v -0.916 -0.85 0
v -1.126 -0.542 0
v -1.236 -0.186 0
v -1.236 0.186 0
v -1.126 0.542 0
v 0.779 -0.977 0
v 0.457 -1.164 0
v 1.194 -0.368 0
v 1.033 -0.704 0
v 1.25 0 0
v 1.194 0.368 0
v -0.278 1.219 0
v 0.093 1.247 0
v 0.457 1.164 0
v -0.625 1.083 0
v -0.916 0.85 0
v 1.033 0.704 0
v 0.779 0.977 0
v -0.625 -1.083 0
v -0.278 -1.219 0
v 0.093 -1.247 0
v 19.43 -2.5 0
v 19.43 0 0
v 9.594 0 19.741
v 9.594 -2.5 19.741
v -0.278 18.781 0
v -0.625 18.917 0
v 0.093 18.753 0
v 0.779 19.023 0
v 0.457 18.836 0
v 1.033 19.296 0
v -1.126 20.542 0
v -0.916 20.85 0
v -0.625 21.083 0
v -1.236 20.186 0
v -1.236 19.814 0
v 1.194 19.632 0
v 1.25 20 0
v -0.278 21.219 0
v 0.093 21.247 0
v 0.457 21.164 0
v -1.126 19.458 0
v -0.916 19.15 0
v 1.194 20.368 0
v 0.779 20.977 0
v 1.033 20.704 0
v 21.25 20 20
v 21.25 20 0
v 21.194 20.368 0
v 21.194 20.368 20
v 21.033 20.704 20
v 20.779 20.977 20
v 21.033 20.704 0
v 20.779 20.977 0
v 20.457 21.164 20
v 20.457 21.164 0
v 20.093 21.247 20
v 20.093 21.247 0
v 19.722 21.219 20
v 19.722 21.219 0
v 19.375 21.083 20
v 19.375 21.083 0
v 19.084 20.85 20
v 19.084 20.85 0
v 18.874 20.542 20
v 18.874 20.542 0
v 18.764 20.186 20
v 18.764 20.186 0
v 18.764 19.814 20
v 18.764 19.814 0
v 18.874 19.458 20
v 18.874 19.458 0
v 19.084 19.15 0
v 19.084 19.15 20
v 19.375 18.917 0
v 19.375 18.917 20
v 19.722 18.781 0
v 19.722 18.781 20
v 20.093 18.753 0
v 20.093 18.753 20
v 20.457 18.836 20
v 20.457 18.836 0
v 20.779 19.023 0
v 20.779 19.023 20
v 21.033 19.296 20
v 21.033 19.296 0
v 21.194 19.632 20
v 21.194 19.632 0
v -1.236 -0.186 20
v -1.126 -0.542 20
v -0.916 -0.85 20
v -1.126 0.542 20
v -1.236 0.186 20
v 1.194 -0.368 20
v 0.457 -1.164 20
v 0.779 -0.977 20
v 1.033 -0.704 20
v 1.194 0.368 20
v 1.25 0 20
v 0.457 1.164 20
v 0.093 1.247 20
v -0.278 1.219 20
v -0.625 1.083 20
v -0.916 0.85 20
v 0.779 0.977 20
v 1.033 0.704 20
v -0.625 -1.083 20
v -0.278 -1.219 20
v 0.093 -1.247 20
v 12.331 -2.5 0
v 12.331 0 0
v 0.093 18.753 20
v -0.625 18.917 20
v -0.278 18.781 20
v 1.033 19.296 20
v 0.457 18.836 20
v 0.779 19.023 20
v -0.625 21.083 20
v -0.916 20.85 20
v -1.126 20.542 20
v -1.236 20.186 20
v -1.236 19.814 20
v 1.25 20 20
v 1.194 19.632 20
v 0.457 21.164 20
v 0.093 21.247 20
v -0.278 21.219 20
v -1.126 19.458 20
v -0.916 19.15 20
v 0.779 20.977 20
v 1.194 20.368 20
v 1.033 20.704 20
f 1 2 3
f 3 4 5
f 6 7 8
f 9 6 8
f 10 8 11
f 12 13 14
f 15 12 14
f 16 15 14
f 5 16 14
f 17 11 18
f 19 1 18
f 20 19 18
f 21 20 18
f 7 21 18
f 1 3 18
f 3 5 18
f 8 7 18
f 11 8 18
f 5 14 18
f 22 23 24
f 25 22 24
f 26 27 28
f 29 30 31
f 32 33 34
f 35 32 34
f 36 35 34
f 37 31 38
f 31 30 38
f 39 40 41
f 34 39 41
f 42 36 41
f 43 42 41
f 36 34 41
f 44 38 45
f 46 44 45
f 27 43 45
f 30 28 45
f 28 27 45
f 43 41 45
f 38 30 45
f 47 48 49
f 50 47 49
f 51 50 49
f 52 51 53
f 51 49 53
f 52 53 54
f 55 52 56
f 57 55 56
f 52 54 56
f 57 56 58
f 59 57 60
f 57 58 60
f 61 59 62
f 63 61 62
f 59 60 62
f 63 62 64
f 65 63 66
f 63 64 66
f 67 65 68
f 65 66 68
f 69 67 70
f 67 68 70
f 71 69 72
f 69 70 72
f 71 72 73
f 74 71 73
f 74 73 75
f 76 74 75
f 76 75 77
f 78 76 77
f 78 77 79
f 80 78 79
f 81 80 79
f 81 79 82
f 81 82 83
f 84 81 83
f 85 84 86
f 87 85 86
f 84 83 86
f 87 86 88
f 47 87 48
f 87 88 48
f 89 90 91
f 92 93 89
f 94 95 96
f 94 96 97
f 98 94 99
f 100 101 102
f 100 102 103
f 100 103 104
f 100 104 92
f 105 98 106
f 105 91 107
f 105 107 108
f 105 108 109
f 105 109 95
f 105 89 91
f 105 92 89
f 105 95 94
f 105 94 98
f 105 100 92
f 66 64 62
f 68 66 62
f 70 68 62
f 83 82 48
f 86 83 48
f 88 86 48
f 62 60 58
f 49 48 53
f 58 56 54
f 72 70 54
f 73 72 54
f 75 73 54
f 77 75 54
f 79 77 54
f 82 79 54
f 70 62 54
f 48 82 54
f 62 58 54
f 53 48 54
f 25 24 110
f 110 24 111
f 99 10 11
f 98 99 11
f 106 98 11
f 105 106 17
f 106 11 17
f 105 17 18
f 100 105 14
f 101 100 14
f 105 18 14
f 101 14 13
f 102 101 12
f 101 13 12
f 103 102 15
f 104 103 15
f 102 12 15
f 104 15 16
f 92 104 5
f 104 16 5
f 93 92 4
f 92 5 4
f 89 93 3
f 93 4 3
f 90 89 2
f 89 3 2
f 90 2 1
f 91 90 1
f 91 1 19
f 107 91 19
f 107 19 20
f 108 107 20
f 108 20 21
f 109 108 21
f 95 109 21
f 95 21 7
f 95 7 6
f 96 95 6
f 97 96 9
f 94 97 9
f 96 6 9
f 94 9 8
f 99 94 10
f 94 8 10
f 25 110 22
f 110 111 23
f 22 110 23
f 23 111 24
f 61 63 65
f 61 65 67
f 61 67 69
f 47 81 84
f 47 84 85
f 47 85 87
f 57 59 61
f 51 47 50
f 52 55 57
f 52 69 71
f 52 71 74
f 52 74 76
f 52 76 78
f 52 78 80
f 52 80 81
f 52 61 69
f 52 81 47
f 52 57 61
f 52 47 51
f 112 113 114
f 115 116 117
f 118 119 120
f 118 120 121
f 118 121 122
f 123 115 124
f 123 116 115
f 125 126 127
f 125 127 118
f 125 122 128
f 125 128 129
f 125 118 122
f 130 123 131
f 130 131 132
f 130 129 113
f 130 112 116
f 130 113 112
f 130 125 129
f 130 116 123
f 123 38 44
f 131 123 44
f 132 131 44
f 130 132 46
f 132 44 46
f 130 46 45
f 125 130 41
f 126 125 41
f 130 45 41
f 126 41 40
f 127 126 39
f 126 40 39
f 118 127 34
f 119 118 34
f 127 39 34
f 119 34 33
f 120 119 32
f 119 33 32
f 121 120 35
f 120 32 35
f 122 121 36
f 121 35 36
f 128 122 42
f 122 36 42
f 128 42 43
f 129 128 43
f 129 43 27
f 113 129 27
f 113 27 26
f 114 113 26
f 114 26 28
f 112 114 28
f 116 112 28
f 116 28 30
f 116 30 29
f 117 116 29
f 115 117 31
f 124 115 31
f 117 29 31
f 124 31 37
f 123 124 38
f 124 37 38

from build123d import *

# Parameters (mm, degrees)
F0_R     = 1.25
F1_DEPTH = 20
F3_DEPTH = 2.5


with BuildPart() as f1:
    # F0 (on Top) → F1 (new body)
    with BuildSketch(Plane.XY):
        with Locations((0, 20)):
            Circle(F0_R)
        Circle(F0_R)
        with Locations((20, 20)):
            Circle(F0_R)
    extrude(amount=F1_DEPTH)


with BuildPart() as f3:
    # F2 (on Front) → F3 (new body)
    with BuildSketch(Plane.XZ):
        Polygon((12.330556, 0), (19.429661, 0), (9.594443, 19.741047), align=None)
    extrude(amount=F3_DEPTH)


solid = Compound([f1.part, f3.part])
